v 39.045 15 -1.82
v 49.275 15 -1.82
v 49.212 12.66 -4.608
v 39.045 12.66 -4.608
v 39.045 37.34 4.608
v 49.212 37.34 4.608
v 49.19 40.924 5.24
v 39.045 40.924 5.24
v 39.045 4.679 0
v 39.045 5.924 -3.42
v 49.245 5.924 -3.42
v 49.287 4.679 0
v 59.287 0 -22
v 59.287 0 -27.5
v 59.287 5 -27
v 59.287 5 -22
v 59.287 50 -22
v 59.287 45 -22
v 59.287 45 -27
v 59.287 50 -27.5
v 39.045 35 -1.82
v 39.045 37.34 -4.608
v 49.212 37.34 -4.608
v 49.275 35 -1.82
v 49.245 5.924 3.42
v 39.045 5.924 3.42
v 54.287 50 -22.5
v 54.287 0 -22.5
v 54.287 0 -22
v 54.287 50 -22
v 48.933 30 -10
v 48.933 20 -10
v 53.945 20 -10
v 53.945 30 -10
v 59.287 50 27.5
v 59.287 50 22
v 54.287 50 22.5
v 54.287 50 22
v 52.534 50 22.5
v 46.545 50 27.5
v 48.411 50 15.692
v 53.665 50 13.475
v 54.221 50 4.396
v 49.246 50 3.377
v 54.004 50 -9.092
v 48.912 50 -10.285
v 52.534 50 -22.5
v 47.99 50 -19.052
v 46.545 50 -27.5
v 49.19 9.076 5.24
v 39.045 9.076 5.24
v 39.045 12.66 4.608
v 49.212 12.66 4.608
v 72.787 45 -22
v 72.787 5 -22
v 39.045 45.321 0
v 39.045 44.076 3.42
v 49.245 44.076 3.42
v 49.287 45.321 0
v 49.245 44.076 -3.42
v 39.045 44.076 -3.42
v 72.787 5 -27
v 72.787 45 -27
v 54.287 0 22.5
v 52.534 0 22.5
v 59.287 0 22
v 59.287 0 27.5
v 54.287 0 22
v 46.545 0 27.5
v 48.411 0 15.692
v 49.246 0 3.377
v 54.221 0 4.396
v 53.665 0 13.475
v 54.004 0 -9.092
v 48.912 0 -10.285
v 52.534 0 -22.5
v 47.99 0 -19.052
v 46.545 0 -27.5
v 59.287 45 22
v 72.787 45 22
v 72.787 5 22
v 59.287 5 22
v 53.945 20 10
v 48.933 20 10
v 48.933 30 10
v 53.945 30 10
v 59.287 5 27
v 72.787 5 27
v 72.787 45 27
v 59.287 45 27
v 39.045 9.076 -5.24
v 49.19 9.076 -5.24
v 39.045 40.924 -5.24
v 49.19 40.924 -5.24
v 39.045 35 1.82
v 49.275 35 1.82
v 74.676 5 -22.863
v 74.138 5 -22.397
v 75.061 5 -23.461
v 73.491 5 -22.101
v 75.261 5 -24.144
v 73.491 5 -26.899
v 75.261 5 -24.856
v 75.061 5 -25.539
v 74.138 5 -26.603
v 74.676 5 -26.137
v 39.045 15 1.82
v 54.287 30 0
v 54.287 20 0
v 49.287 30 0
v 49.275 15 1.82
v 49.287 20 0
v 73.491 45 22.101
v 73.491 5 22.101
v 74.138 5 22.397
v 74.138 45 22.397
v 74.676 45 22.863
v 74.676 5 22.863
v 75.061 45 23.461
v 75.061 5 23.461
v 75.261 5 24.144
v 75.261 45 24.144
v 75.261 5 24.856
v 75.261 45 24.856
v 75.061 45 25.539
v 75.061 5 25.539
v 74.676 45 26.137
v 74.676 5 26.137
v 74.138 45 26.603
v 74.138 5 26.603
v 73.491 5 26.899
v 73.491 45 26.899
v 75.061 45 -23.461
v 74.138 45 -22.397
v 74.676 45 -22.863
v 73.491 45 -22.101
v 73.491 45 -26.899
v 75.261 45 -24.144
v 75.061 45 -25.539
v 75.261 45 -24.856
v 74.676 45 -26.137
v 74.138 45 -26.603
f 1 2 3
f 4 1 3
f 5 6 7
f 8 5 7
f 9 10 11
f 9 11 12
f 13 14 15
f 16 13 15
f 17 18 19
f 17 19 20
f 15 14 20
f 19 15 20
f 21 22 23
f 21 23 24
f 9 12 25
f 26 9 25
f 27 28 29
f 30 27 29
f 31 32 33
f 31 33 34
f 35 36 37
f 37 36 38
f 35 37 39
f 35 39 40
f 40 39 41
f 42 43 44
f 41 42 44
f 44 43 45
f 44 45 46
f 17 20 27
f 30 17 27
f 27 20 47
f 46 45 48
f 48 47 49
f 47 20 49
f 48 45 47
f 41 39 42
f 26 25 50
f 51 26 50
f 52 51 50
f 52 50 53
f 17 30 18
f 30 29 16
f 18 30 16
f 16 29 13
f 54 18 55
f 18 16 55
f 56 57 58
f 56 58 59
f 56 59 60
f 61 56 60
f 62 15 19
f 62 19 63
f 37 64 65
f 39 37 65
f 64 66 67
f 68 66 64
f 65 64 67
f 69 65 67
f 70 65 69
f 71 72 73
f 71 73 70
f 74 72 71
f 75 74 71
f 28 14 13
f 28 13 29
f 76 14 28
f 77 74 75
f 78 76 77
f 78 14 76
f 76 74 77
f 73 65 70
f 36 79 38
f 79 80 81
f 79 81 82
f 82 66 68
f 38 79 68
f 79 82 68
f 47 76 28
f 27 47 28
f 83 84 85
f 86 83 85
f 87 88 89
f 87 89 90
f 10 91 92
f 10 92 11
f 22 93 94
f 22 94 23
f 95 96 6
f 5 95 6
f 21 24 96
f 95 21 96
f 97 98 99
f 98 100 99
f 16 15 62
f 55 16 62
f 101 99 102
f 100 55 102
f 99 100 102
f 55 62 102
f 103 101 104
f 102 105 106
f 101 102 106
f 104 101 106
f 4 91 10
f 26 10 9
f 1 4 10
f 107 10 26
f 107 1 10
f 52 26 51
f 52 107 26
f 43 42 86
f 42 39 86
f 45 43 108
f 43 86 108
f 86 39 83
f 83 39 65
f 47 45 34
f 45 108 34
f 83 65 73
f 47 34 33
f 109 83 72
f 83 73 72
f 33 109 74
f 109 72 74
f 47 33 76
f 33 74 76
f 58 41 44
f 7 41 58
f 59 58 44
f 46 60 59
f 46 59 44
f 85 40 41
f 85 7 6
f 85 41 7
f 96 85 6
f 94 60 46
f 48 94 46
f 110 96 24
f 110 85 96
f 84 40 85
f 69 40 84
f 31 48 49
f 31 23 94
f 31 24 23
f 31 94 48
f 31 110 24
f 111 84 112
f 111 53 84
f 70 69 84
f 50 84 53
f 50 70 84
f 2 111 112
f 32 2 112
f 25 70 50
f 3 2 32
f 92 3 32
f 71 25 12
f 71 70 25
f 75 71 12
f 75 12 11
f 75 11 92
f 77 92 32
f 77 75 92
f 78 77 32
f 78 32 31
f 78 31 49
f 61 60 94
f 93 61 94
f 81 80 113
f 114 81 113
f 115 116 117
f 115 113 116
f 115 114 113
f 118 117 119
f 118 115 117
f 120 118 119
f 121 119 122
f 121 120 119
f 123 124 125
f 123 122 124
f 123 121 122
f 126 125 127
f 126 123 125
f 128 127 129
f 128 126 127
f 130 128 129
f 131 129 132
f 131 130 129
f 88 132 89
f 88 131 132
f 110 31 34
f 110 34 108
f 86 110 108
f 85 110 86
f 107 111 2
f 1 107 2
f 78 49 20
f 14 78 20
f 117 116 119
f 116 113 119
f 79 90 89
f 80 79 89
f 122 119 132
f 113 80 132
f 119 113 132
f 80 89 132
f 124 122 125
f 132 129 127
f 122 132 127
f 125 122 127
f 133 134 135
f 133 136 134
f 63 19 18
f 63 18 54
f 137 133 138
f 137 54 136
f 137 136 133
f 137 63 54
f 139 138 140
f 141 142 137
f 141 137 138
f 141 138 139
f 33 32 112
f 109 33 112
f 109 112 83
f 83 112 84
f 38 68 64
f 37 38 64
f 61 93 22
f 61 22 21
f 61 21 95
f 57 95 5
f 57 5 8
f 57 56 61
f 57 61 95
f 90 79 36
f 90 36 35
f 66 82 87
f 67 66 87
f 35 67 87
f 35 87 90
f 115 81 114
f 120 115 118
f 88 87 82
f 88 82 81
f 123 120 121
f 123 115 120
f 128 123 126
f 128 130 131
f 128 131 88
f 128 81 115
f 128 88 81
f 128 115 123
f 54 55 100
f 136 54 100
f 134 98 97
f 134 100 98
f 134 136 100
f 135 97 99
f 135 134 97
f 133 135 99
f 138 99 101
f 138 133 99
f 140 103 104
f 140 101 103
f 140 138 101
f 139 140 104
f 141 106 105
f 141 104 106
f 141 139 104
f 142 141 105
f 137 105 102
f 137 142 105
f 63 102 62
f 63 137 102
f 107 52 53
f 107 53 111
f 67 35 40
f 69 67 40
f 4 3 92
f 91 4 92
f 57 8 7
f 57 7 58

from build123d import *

# Parameters (mm, degrees)
BOSS_EXTRUDE1_DEPTH      = 50
SHELL1_T                 = -5
BOSS_EXTRUDE2_DEPTH      = 7.5
BOSS_EXTRUDE2_DEPTH_BACK = 5
SKETCH4_W                = 20
SKETCH4_H                = 10
CUT_EXTRUDE1_DEPTH       = 10
FILLET1_RADIUS           = 2.5
FILLET1_LENGTH           = 50
FILLET2_RADIUS           = 2.5
FILLET2_LENGTH           = 50
SKETCH7_W                = 16
SKETCH7_H                = 5
CUT_EXTRUDE3_DEPTH       = 10


with BuildPart() as part:
    # Sketch2 → Boss-Extrude1 (new body)
    with BuildSketch(Plane(origin=(0, 0, 0), x_dir=(1, 0, 0), z_dir=(0, 1, 0))):
        with BuildLine():
            Line((46.545206992, 27.5), (49.2865347, 27.5))
            Line((49.2865347, 27.5), (59.2865347, 27.5))
            Line((59.2865347, 27.5), (59.2865347, 27))
            Line((59.2865347, 27), (75.2865347, 27))
            Line((75.2865347, 27), (75.2865347, -27))
            Line((75.2865347, -27), (59.2865347, -27))
            Line((59.2865347, -27), (59.2865347, -27.5))
            Line((59.2865347, -27.5), (49.2865347, -27.5))
            Line((49.2865347, -27.5), (46.545206992, -27.5))
            add(Edge.make_bspline(
                [(46.545206992, -27.5), (52.189315716, 0), (46.545206992, 27.5)],
                knots=[4.377296144, 4.377296144, 4.377296144, 5.047481816, 5.047481816, 5.047481816], degree=2, weights=[1, 0.944379784, 1]))
        make_face()
    extrude(amount=BOSS_EXTRUDE1_DEPTH)

    # Shell1
    shell1_openings = [part.faces().sort_by_distance(p)[0] for p in [
        (61.762813671, 50, 0),
        (61.762813671, 0, 0),
        (75.2865347, 25, 0),
    ]]
    offset(amount=SHELL1_T, openings=shell1_openings, kind=Kind.INTERSECTION)

    # Sketch3 → Boss-Extrude2 (add, two sides: drawn at the far end of the back side and taken through both)
    with BuildSketch(Plane.ZY.offset(-46.545206992).offset(-BOSS_EXTRUDE2_DEPTH_BACK)):
        Polygon((-5.240052605, 40.923962655), (-4.608024926, 37.339555569), (-1.819851171, 35), (1.819851171, 35), (4.608024926, 37.339555569), (5.240052605, 40.923962655), (3.420201433, 44.076037345), (0, 45.320888862), (-3.420201433, 44.076037345), align=None)
        Polygon((0, 4.679111138), (3.420201433, 5.923962655), (5.240052605, 9.076037345), (4.608024926, 12.660444431), (1.819851171, 15), (-1.819851171, 15), (-4.608024926, 12.660444431), (-5.240052605, 9.076037345), (-3.420201433, 5.923962655), align=None)
    extrude(amount=BOSS_EXTRUDE2_DEPTH + BOSS_EXTRUDE2_DEPTH_BACK)

    # Sketch4 → Cut-Extrude1 (cut)
    with BuildSketch(Plane.ZY.offset(-46.545206992)):
        with Locations((0, 25)):
            Rectangle(SKETCH4_W, SKETCH4_H)
    extrude(amount=-CUT_EXTRUDE1_DEPTH, mode=Mode.SUBTRACT)

    # Fillet1: full round fillet: the end face becomes a half cylinder, R = half its width
    fillet1_face = Plane((75.2865347, 25, -24.5), x_dir=(0, 1, 0), z_dir=(1, 0, 0))  # on the end face: x along it, z out of the body
    fillet1_slab = fillet1_face.offset(-FILLET1_RADIUS / 2) * Box(FILLET1_LENGTH, 2 * FILLET1_RADIUS, FILLET1_RADIUS, mode=Mode.PRIVATE)  # the body's end, R deep
    fillet1_round = Plane((72.7865347, 25, -24.5), x_dir=(1, 0, 0), z_dir=(0, 1, 0)) * Cylinder(FILLET1_RADIUS, FILLET1_LENGTH, mode=Mode.PRIVATE)  # its axis R under the face
    add(fillet1_slab - fillet1_round, mode=Mode.SUBTRACT)

    # Fillet2: full round fillet: the end face becomes a half cylinder, R = half its width
    fillet2_face = Plane((75.2865347, 25, 24.5), x_dir=(0, -1, 0), z_dir=(1, 0, 0))  # on the end face: x along it, z out of the body
    fillet2_slab = fillet2_face.offset(-FILLET2_RADIUS / 2) * Box(FILLET2_LENGTH, 2 * FILLET2_RADIUS, FILLET2_RADIUS, mode=Mode.PRIVATE)  # the body's end, R deep
    fillet2_round = Plane((72.7865347, 25, 24.5), x_dir=(1, 0, 0), z_dir=(0, -1, 0)) * Cylinder(FILLET2_RADIUS, FILLET2_LENGTH, mode=Mode.PRIVATE)  # its axis R under the face
    add(fillet2_slab - fillet2_round, mode=Mode.SUBTRACT)

    # Sketch7 → Cut-Extrude3 (cut)
    with BuildSketch(Plane.XY.offset(27)):
        with Locations((67.2865347, 47.5)):
            Rectangle(SKETCH7_W, SKETCH7_H)
        with Locations((67.2865347, 2.5)):
            Rectangle(SKETCH7_W, SKETCH7_H)
    cut_extrude3 = extrude(amount=-CUT_EXTRUDE3_DEPTH, mode=Mode.SUBTRACT)

    # Mirror2: Cut-Extrude3 across plane
    add(cut_extrude3.mirror(Plane.XY), mode=Mode.SUBTRACT)


solid = part.part
